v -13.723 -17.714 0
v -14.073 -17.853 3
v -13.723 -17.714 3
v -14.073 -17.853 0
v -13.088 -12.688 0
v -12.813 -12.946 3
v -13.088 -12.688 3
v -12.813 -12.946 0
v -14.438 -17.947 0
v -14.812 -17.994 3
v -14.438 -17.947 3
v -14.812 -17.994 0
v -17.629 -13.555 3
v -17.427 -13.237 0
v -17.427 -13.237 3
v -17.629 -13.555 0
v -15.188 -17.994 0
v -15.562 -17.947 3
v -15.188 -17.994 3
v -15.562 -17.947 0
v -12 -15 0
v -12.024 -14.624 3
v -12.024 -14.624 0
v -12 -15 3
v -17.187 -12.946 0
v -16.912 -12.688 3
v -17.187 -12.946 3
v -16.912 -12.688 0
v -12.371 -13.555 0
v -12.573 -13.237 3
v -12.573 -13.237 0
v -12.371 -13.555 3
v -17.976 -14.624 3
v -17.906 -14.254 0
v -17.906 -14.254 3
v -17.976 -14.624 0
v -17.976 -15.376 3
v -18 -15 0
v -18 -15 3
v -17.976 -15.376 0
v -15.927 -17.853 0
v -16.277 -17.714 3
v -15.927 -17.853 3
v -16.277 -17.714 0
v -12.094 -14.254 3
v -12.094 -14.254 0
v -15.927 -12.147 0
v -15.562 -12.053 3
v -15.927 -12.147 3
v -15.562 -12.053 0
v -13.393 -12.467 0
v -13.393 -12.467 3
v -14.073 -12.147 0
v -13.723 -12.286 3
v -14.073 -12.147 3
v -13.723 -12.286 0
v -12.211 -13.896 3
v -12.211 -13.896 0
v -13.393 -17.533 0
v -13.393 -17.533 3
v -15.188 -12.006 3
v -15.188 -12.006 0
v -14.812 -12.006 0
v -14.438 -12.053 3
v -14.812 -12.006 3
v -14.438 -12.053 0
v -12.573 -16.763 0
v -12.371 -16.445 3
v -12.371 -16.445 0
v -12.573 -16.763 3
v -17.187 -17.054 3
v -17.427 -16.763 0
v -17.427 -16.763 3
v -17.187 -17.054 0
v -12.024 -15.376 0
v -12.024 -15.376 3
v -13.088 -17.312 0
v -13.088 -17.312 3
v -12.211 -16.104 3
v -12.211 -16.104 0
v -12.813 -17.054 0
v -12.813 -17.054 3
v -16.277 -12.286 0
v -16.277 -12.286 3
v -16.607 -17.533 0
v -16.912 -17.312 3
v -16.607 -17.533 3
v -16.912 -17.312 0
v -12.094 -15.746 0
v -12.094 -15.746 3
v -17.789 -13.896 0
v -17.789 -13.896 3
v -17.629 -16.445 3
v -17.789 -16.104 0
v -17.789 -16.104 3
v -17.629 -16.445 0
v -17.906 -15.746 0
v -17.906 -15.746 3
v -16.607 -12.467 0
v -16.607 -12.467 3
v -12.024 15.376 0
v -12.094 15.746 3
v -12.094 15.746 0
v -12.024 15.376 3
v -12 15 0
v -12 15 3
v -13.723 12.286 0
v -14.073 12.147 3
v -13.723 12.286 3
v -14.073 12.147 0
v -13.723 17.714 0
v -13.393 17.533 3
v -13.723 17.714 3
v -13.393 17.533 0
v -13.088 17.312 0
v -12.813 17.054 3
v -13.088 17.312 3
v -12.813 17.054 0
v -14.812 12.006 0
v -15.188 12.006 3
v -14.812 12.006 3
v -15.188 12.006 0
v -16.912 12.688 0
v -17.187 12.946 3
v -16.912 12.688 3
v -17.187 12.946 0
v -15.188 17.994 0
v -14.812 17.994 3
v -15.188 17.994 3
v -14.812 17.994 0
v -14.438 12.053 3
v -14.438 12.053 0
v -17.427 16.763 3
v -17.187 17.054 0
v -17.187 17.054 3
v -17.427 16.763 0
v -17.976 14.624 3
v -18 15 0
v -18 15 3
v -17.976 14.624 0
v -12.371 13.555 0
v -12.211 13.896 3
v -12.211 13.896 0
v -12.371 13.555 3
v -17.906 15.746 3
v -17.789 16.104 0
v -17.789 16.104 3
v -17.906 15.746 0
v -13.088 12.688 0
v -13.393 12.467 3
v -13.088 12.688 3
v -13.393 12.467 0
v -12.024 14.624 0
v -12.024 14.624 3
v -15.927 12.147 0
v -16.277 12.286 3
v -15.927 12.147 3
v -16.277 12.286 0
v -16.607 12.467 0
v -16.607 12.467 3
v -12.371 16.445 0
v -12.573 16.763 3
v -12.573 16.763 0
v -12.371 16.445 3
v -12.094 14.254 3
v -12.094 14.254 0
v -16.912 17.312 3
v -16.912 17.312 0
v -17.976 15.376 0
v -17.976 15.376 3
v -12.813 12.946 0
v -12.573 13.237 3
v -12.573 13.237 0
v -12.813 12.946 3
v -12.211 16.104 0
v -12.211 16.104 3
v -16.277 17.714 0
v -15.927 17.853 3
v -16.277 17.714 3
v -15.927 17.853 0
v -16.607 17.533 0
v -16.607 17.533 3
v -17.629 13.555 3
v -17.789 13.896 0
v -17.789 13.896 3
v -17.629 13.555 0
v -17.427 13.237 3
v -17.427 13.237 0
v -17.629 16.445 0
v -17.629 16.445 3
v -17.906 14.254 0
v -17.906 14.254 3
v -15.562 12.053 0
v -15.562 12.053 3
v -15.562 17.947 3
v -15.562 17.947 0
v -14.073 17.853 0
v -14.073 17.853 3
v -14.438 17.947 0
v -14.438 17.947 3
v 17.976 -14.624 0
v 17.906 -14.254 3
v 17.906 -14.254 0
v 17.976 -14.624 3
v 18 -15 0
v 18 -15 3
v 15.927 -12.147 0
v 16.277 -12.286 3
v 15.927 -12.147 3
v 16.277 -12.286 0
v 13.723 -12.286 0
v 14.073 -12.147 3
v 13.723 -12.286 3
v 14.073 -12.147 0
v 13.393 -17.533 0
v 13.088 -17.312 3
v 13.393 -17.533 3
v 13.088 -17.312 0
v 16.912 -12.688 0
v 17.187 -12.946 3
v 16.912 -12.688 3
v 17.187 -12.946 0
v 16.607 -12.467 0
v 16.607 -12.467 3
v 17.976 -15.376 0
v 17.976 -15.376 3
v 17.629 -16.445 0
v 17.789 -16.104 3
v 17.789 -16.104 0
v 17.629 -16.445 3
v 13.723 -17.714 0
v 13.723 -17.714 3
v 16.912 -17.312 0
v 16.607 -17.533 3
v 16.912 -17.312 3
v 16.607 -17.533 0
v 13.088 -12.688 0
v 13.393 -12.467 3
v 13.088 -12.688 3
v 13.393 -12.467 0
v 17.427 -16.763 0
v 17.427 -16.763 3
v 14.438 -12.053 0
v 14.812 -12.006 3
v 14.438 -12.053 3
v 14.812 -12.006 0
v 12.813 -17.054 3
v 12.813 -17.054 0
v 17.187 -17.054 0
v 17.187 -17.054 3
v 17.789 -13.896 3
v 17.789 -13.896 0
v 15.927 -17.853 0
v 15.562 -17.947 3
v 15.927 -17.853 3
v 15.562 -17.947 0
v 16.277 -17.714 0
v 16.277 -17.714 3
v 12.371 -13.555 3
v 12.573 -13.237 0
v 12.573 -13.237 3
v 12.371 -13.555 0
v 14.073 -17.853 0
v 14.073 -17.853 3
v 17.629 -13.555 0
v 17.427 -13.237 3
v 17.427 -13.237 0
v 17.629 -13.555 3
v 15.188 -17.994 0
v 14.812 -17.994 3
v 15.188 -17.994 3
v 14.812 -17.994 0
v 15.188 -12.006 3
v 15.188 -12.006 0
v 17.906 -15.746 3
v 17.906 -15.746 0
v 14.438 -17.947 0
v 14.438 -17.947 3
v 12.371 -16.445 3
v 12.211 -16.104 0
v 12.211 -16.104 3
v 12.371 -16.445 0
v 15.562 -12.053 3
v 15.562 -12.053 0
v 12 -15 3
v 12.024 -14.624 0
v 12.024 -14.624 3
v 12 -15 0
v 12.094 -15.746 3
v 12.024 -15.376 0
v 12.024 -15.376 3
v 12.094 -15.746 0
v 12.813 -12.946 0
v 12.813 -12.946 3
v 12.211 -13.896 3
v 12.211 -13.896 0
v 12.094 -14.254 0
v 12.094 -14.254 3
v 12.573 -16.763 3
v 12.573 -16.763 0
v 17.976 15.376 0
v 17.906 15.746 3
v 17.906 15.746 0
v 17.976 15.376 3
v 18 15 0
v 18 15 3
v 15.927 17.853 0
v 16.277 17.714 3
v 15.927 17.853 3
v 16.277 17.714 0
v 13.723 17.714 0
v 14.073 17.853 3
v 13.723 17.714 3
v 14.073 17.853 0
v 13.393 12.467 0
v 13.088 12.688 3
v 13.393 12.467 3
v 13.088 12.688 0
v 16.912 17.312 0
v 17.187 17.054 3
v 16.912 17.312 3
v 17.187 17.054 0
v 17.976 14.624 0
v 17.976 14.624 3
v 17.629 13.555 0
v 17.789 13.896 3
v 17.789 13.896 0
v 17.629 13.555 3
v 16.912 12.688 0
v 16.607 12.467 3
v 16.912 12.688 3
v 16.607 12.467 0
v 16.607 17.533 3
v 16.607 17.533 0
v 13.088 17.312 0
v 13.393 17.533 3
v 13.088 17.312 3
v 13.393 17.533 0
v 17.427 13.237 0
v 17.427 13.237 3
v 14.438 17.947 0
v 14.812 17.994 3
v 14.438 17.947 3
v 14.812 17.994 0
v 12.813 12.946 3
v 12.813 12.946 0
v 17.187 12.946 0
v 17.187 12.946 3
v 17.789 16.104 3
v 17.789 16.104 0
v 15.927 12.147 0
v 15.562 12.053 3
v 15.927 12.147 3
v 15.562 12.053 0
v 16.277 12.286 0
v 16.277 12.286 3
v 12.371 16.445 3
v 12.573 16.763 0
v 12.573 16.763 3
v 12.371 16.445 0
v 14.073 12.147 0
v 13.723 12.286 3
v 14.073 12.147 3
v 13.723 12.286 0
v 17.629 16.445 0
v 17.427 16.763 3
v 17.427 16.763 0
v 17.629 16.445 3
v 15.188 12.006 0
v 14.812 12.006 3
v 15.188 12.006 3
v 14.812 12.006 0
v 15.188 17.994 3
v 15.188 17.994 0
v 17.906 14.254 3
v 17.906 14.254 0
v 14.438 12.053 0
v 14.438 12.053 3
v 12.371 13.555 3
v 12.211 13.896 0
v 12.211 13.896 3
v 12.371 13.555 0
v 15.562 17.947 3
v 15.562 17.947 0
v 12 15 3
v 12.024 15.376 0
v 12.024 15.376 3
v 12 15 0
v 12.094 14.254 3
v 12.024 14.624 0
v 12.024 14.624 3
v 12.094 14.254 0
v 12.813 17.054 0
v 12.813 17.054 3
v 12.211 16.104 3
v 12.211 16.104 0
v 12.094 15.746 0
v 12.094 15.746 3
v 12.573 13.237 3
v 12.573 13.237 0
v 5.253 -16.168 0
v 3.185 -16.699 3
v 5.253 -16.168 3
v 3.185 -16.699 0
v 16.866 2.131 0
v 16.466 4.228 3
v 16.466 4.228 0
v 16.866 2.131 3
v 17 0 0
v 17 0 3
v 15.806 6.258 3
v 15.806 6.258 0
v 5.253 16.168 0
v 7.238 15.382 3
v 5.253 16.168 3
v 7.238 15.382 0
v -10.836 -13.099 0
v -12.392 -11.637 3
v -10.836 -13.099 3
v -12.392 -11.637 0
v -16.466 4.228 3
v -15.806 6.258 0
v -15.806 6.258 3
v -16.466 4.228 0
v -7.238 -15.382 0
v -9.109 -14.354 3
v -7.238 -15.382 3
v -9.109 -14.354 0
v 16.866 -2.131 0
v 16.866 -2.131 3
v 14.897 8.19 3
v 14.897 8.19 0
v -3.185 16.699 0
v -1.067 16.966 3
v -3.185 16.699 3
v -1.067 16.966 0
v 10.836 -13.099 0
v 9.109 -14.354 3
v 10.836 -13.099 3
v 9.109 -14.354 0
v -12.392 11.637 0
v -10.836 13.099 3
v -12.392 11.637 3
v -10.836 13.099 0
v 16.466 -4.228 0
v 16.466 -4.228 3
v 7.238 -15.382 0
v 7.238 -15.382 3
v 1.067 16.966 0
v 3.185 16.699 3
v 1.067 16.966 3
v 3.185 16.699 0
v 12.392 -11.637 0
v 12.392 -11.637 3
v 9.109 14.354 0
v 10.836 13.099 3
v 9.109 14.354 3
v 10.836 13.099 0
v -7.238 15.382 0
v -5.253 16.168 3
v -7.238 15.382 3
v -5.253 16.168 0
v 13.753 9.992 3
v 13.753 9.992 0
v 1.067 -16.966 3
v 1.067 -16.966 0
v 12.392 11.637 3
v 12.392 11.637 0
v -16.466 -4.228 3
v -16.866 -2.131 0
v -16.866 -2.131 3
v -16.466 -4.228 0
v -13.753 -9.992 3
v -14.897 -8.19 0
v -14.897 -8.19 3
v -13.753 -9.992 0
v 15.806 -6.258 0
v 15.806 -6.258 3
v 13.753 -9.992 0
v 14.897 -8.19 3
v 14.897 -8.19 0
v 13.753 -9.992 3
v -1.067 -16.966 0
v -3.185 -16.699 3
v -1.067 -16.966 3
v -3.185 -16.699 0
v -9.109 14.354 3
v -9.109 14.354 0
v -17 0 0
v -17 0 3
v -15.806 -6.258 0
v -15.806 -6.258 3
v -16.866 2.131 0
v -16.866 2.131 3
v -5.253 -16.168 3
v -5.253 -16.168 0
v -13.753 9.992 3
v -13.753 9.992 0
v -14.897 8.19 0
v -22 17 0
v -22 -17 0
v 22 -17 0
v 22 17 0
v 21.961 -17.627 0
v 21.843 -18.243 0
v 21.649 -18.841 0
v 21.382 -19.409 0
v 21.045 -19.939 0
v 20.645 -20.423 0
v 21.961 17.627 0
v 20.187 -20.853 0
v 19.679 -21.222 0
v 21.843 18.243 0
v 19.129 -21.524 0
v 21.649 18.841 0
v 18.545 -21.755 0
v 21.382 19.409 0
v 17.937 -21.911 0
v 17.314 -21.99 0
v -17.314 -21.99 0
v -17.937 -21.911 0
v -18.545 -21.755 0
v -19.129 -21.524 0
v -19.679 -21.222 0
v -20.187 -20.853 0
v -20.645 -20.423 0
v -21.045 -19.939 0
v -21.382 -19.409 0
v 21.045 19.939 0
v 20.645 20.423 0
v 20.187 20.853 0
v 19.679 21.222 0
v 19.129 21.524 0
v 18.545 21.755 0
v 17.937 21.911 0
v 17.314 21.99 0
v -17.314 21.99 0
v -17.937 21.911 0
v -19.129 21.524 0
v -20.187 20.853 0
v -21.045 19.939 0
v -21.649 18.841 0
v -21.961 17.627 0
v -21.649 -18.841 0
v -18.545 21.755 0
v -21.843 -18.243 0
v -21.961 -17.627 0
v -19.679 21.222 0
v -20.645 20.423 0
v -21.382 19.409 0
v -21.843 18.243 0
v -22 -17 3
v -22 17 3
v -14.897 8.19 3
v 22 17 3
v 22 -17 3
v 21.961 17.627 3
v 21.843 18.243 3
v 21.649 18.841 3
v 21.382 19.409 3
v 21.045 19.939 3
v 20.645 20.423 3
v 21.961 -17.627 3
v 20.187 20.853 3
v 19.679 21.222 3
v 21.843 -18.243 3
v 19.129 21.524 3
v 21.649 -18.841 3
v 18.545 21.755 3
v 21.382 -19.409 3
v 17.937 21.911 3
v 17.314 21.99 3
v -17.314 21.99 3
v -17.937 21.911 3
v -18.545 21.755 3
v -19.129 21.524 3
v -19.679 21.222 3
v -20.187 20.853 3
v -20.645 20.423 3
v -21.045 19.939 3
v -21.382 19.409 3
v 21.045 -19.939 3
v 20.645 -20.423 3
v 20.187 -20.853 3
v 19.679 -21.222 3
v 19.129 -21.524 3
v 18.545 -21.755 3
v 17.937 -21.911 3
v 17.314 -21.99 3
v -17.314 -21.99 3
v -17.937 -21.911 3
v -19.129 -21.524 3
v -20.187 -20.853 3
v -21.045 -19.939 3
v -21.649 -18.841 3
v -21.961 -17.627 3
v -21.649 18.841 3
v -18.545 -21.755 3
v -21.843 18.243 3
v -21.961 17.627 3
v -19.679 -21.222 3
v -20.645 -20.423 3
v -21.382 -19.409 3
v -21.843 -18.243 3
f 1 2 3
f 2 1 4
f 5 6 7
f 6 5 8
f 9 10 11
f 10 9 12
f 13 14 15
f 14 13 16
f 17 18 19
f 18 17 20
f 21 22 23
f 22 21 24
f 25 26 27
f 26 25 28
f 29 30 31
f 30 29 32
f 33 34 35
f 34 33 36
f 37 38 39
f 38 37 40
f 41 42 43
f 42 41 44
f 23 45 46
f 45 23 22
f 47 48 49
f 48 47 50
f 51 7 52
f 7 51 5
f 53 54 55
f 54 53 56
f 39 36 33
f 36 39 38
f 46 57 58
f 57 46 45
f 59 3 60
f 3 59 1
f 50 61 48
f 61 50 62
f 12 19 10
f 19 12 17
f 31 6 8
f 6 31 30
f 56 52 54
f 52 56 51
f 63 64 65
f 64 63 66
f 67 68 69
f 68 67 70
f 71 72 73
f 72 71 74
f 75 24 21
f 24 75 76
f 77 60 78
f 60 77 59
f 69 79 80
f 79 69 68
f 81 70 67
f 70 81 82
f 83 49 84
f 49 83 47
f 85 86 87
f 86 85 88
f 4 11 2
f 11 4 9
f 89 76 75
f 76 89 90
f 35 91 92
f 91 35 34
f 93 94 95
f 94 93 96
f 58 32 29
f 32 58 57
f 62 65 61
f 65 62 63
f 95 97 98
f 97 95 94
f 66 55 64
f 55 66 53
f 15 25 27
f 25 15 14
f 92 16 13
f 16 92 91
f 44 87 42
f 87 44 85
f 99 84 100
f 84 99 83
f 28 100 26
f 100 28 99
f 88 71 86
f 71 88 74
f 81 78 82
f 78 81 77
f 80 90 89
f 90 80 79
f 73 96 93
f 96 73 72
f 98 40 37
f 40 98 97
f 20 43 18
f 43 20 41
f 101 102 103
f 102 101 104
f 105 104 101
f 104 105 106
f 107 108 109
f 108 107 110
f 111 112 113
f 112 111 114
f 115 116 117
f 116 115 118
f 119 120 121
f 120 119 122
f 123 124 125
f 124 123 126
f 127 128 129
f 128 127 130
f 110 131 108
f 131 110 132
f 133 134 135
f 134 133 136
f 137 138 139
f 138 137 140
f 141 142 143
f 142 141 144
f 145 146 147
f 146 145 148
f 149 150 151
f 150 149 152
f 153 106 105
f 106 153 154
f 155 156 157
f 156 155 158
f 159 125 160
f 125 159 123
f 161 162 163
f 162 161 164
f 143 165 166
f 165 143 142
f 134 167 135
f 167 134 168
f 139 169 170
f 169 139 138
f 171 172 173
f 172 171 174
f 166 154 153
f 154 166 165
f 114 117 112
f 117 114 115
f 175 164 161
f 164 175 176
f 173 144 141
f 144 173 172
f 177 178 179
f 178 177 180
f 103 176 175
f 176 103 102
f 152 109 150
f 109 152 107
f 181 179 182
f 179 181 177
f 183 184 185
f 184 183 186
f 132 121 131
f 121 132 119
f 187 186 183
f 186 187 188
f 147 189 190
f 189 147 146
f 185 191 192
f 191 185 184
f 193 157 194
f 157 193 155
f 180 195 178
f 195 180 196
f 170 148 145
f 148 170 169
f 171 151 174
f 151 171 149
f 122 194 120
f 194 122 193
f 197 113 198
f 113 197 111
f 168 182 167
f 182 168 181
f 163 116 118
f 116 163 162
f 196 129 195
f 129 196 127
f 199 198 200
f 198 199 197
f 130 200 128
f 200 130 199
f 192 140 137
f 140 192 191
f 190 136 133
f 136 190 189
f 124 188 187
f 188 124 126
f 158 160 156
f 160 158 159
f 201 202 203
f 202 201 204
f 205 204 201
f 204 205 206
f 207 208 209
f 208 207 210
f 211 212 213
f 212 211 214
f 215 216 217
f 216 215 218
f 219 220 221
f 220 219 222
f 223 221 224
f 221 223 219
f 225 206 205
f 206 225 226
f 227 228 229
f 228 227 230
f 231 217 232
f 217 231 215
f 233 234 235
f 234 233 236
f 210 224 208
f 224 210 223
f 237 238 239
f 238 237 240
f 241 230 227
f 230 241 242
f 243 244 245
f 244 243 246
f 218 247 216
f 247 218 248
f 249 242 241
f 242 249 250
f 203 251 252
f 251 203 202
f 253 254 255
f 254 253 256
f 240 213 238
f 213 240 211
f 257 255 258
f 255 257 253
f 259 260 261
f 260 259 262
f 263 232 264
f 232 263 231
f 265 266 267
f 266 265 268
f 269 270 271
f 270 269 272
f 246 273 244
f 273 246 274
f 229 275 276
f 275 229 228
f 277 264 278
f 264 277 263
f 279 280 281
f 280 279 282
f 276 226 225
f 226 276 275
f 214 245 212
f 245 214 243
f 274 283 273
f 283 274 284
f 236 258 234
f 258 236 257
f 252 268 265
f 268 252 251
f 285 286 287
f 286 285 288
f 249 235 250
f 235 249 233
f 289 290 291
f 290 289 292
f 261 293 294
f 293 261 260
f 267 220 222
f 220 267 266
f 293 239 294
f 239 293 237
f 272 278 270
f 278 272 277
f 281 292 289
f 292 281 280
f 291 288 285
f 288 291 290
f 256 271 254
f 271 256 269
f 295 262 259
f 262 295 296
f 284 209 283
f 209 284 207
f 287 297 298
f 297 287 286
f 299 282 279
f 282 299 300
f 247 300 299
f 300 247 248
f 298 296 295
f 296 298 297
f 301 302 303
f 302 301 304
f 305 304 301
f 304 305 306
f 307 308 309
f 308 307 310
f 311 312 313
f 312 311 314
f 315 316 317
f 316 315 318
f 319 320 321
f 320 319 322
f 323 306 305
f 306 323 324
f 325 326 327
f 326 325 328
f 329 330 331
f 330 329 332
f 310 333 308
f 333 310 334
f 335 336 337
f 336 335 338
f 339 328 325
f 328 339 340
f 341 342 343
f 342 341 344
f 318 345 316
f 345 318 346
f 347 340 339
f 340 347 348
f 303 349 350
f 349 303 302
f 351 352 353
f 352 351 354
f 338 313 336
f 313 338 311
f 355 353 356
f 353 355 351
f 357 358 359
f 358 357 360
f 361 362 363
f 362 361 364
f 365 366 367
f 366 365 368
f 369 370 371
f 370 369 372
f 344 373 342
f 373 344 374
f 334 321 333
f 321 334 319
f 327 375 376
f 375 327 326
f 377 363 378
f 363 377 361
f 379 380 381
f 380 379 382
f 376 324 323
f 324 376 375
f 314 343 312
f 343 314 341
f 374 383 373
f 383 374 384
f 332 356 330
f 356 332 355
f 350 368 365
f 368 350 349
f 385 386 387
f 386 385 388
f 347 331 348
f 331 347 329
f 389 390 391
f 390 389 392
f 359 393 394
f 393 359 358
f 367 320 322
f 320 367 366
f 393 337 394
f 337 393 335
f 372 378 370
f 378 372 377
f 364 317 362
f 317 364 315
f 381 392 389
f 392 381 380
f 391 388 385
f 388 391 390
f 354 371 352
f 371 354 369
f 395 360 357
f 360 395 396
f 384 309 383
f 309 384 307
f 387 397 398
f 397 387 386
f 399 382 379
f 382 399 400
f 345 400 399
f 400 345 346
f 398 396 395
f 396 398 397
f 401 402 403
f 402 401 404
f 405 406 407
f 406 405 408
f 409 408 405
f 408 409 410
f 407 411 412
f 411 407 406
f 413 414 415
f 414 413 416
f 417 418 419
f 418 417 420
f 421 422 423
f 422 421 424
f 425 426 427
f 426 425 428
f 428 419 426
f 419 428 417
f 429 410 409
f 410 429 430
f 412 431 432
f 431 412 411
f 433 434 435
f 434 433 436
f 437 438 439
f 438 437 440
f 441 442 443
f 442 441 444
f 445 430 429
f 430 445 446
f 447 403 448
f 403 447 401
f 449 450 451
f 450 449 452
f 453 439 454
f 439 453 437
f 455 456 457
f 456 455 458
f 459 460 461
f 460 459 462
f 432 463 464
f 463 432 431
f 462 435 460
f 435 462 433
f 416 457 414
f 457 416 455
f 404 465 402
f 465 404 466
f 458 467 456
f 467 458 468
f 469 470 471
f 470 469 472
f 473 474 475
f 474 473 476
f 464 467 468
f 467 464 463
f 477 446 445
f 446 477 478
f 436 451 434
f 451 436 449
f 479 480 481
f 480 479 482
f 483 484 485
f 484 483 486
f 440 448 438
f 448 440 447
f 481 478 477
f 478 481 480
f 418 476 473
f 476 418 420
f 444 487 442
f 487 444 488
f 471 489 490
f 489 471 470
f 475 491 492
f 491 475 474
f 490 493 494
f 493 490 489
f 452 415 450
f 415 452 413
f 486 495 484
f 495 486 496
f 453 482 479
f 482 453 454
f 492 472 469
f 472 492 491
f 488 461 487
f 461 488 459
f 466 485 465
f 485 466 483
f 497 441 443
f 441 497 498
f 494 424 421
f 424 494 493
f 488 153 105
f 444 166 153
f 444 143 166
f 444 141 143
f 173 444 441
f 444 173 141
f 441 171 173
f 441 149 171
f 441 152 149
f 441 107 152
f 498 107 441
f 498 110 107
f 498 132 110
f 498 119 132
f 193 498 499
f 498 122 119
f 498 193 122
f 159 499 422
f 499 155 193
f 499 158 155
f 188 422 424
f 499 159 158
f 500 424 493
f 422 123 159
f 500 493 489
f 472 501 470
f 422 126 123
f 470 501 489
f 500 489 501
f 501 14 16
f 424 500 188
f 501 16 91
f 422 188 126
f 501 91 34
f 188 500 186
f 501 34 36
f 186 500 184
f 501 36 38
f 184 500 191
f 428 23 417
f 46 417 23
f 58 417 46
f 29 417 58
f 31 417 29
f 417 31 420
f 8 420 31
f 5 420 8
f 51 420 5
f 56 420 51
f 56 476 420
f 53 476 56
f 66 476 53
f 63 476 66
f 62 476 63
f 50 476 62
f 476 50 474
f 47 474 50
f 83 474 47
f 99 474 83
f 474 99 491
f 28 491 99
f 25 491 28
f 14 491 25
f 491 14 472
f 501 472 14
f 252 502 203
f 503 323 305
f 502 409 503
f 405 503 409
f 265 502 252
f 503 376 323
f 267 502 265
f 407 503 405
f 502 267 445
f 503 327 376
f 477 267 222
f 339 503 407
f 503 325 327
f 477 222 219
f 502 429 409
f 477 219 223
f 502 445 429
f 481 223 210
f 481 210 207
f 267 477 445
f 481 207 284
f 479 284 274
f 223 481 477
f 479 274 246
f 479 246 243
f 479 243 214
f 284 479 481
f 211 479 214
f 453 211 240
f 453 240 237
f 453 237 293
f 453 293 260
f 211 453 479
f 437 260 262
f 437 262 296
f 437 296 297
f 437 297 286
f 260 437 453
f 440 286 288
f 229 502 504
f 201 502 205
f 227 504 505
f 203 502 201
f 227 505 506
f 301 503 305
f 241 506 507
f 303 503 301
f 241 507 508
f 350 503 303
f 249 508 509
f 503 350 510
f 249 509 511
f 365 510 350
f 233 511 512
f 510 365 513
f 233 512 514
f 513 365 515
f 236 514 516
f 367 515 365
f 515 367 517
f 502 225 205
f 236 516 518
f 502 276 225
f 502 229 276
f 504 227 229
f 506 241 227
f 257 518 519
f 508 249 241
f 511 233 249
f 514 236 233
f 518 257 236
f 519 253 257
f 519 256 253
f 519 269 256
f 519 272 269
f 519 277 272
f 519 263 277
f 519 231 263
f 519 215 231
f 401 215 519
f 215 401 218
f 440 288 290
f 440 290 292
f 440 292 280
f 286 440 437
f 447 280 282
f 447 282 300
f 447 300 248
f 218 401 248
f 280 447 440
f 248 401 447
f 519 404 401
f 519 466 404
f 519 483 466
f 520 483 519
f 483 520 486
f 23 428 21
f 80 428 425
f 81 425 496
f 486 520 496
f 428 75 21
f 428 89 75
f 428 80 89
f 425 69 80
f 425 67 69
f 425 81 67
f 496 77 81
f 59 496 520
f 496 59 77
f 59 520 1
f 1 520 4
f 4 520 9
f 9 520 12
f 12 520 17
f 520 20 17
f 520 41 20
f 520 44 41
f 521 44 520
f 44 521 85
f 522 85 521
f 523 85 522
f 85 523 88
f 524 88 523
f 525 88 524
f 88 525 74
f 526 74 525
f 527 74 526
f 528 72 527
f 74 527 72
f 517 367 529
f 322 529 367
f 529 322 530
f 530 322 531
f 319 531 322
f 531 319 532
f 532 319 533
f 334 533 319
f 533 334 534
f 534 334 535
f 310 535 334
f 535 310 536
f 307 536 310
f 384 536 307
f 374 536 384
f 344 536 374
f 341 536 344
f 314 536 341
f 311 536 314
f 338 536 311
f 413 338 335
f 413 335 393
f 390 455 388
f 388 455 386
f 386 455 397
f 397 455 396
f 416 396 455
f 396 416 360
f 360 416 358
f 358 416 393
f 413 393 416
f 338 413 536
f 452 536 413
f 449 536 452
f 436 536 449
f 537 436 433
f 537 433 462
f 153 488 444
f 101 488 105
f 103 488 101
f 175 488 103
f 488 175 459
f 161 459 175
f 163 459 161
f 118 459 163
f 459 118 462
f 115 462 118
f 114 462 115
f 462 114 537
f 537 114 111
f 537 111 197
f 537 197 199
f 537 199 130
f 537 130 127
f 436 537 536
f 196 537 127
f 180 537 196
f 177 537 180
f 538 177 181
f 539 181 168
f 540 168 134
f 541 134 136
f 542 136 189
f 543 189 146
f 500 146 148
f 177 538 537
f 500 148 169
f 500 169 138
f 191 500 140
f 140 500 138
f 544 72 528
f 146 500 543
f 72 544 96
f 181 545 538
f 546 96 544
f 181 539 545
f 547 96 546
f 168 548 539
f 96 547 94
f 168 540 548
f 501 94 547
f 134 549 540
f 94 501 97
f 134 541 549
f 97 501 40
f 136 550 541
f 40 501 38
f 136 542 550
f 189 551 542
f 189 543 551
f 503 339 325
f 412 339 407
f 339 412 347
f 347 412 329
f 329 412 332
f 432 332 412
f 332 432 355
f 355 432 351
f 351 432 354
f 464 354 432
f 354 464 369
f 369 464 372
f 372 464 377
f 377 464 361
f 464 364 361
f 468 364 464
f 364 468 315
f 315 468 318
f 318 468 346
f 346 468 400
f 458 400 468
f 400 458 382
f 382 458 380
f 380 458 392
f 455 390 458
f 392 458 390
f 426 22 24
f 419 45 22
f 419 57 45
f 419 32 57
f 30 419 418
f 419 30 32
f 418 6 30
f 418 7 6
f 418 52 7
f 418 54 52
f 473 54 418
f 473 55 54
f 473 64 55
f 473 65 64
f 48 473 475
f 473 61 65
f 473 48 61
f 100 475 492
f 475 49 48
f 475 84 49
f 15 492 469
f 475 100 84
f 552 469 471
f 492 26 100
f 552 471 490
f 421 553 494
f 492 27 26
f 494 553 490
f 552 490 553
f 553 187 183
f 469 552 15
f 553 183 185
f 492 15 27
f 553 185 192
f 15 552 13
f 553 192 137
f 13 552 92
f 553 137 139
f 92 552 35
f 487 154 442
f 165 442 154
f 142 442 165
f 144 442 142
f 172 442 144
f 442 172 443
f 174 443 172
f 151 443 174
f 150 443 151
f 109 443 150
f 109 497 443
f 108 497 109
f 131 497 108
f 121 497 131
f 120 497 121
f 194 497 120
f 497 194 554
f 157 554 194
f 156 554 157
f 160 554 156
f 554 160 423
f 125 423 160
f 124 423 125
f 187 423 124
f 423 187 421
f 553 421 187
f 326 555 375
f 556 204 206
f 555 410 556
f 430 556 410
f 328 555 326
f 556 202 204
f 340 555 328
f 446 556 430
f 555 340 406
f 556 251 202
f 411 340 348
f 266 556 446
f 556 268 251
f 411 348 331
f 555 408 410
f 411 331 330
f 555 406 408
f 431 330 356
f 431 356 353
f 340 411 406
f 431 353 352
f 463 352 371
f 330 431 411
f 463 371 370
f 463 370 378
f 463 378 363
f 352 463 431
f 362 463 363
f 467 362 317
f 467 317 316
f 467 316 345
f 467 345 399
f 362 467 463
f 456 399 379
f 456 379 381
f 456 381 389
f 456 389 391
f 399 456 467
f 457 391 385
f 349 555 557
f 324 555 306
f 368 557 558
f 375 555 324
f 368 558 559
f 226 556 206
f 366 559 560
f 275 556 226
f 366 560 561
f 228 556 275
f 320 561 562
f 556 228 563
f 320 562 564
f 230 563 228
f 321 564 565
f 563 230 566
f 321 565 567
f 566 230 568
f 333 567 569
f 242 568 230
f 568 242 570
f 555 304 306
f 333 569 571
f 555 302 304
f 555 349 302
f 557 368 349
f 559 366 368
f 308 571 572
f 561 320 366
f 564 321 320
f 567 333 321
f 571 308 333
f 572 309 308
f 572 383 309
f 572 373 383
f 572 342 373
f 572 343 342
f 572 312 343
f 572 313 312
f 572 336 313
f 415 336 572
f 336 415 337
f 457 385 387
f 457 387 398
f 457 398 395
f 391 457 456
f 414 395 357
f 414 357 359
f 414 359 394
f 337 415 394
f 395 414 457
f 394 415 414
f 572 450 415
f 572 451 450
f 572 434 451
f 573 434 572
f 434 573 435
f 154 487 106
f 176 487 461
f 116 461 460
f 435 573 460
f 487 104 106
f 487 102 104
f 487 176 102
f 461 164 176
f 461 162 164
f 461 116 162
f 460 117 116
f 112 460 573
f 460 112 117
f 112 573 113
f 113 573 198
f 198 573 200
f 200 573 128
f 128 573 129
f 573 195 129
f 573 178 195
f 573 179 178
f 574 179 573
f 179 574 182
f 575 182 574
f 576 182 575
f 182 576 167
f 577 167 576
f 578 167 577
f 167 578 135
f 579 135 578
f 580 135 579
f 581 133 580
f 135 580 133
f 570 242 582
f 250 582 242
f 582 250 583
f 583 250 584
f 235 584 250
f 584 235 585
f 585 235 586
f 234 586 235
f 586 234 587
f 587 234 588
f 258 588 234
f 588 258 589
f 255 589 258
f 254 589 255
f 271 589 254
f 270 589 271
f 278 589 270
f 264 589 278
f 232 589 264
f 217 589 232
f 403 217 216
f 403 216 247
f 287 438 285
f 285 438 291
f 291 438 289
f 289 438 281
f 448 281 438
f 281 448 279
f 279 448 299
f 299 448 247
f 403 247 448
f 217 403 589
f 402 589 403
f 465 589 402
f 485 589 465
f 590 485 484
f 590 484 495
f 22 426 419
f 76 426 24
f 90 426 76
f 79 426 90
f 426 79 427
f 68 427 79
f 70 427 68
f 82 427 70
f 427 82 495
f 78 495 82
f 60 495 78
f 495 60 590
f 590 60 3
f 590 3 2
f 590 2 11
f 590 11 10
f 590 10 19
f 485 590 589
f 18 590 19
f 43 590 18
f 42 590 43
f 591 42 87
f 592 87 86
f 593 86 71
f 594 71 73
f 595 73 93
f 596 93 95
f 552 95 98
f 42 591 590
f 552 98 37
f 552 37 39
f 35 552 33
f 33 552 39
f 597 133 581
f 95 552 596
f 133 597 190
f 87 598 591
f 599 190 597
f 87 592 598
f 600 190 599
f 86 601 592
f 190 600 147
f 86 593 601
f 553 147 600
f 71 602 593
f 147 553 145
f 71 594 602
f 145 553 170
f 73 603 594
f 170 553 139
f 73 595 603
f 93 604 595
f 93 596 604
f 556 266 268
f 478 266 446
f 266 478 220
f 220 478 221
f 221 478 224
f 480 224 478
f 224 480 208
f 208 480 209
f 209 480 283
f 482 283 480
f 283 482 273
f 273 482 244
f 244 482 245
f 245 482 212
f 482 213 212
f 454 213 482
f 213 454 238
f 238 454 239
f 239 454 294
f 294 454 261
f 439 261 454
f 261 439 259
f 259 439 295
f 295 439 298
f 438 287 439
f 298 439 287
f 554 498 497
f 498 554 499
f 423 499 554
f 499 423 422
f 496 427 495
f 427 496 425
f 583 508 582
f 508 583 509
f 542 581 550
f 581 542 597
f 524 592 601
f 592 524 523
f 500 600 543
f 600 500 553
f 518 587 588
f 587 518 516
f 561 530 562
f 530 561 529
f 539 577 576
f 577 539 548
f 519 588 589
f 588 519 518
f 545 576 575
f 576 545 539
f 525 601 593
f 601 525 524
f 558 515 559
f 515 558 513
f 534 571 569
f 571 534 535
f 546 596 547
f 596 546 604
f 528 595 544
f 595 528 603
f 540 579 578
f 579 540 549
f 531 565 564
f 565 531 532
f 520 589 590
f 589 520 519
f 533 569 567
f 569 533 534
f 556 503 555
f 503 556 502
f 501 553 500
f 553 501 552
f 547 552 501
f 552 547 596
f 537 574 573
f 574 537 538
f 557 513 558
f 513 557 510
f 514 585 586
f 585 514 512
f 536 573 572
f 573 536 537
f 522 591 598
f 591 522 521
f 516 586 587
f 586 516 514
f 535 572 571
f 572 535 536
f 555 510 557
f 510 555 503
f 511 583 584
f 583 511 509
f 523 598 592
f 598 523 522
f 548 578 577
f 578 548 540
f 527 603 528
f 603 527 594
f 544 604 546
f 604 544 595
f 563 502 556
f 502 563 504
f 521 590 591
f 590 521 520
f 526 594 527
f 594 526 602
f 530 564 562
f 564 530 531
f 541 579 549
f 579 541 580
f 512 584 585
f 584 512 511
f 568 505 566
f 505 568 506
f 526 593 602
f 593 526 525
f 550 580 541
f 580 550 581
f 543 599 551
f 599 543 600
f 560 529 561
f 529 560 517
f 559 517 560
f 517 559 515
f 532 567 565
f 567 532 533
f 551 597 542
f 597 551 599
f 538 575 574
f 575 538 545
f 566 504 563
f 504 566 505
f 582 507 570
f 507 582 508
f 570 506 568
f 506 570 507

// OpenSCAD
$fn = 50;


difference() {
	union() {
		hull() {
			translate(v = [-17.0000000000, 17.0000000000, 0]) {
				cylinder(h = 3, r = 5);
			}
			translate(v = [17.0000000000, 17.0000000000, 0]) {
				cylinder(h = 3, r = 5);
			}
			translate(v = [-17.0000000000, -17.0000000000, 0]) {
				cylinder(h = 3, r = 5);
			}
			translate(v = [17.0000000000, -17.0000000000, 0]) {
				cylinder(h = 3, r = 5);
			}
		}
	}
	union() {
		#translate(v = [-15.0000000000, -15.0000000000, -100.0000000000]) {
			cylinder(h = 200, r = 3.0000000000);
		}
		#translate(v = [-15.0000000000, 15.0000000000, -100.0000000000]) {
			cylinder(h = 200, r = 3.0000000000);
		}
		#translate(v = [15.0000000000, -15.0000000000, -100.0000000000]) {
			cylinder(h = 200, r = 3.0000000000);
		}
		#translate(v = [15.0000000000, 15.0000000000, -100.0000000000]) {
			cylinder(h = 200, r = 3.0000000000);
		}
		#cylinder(h = 3, r = 17.0000000000);
	}
}
